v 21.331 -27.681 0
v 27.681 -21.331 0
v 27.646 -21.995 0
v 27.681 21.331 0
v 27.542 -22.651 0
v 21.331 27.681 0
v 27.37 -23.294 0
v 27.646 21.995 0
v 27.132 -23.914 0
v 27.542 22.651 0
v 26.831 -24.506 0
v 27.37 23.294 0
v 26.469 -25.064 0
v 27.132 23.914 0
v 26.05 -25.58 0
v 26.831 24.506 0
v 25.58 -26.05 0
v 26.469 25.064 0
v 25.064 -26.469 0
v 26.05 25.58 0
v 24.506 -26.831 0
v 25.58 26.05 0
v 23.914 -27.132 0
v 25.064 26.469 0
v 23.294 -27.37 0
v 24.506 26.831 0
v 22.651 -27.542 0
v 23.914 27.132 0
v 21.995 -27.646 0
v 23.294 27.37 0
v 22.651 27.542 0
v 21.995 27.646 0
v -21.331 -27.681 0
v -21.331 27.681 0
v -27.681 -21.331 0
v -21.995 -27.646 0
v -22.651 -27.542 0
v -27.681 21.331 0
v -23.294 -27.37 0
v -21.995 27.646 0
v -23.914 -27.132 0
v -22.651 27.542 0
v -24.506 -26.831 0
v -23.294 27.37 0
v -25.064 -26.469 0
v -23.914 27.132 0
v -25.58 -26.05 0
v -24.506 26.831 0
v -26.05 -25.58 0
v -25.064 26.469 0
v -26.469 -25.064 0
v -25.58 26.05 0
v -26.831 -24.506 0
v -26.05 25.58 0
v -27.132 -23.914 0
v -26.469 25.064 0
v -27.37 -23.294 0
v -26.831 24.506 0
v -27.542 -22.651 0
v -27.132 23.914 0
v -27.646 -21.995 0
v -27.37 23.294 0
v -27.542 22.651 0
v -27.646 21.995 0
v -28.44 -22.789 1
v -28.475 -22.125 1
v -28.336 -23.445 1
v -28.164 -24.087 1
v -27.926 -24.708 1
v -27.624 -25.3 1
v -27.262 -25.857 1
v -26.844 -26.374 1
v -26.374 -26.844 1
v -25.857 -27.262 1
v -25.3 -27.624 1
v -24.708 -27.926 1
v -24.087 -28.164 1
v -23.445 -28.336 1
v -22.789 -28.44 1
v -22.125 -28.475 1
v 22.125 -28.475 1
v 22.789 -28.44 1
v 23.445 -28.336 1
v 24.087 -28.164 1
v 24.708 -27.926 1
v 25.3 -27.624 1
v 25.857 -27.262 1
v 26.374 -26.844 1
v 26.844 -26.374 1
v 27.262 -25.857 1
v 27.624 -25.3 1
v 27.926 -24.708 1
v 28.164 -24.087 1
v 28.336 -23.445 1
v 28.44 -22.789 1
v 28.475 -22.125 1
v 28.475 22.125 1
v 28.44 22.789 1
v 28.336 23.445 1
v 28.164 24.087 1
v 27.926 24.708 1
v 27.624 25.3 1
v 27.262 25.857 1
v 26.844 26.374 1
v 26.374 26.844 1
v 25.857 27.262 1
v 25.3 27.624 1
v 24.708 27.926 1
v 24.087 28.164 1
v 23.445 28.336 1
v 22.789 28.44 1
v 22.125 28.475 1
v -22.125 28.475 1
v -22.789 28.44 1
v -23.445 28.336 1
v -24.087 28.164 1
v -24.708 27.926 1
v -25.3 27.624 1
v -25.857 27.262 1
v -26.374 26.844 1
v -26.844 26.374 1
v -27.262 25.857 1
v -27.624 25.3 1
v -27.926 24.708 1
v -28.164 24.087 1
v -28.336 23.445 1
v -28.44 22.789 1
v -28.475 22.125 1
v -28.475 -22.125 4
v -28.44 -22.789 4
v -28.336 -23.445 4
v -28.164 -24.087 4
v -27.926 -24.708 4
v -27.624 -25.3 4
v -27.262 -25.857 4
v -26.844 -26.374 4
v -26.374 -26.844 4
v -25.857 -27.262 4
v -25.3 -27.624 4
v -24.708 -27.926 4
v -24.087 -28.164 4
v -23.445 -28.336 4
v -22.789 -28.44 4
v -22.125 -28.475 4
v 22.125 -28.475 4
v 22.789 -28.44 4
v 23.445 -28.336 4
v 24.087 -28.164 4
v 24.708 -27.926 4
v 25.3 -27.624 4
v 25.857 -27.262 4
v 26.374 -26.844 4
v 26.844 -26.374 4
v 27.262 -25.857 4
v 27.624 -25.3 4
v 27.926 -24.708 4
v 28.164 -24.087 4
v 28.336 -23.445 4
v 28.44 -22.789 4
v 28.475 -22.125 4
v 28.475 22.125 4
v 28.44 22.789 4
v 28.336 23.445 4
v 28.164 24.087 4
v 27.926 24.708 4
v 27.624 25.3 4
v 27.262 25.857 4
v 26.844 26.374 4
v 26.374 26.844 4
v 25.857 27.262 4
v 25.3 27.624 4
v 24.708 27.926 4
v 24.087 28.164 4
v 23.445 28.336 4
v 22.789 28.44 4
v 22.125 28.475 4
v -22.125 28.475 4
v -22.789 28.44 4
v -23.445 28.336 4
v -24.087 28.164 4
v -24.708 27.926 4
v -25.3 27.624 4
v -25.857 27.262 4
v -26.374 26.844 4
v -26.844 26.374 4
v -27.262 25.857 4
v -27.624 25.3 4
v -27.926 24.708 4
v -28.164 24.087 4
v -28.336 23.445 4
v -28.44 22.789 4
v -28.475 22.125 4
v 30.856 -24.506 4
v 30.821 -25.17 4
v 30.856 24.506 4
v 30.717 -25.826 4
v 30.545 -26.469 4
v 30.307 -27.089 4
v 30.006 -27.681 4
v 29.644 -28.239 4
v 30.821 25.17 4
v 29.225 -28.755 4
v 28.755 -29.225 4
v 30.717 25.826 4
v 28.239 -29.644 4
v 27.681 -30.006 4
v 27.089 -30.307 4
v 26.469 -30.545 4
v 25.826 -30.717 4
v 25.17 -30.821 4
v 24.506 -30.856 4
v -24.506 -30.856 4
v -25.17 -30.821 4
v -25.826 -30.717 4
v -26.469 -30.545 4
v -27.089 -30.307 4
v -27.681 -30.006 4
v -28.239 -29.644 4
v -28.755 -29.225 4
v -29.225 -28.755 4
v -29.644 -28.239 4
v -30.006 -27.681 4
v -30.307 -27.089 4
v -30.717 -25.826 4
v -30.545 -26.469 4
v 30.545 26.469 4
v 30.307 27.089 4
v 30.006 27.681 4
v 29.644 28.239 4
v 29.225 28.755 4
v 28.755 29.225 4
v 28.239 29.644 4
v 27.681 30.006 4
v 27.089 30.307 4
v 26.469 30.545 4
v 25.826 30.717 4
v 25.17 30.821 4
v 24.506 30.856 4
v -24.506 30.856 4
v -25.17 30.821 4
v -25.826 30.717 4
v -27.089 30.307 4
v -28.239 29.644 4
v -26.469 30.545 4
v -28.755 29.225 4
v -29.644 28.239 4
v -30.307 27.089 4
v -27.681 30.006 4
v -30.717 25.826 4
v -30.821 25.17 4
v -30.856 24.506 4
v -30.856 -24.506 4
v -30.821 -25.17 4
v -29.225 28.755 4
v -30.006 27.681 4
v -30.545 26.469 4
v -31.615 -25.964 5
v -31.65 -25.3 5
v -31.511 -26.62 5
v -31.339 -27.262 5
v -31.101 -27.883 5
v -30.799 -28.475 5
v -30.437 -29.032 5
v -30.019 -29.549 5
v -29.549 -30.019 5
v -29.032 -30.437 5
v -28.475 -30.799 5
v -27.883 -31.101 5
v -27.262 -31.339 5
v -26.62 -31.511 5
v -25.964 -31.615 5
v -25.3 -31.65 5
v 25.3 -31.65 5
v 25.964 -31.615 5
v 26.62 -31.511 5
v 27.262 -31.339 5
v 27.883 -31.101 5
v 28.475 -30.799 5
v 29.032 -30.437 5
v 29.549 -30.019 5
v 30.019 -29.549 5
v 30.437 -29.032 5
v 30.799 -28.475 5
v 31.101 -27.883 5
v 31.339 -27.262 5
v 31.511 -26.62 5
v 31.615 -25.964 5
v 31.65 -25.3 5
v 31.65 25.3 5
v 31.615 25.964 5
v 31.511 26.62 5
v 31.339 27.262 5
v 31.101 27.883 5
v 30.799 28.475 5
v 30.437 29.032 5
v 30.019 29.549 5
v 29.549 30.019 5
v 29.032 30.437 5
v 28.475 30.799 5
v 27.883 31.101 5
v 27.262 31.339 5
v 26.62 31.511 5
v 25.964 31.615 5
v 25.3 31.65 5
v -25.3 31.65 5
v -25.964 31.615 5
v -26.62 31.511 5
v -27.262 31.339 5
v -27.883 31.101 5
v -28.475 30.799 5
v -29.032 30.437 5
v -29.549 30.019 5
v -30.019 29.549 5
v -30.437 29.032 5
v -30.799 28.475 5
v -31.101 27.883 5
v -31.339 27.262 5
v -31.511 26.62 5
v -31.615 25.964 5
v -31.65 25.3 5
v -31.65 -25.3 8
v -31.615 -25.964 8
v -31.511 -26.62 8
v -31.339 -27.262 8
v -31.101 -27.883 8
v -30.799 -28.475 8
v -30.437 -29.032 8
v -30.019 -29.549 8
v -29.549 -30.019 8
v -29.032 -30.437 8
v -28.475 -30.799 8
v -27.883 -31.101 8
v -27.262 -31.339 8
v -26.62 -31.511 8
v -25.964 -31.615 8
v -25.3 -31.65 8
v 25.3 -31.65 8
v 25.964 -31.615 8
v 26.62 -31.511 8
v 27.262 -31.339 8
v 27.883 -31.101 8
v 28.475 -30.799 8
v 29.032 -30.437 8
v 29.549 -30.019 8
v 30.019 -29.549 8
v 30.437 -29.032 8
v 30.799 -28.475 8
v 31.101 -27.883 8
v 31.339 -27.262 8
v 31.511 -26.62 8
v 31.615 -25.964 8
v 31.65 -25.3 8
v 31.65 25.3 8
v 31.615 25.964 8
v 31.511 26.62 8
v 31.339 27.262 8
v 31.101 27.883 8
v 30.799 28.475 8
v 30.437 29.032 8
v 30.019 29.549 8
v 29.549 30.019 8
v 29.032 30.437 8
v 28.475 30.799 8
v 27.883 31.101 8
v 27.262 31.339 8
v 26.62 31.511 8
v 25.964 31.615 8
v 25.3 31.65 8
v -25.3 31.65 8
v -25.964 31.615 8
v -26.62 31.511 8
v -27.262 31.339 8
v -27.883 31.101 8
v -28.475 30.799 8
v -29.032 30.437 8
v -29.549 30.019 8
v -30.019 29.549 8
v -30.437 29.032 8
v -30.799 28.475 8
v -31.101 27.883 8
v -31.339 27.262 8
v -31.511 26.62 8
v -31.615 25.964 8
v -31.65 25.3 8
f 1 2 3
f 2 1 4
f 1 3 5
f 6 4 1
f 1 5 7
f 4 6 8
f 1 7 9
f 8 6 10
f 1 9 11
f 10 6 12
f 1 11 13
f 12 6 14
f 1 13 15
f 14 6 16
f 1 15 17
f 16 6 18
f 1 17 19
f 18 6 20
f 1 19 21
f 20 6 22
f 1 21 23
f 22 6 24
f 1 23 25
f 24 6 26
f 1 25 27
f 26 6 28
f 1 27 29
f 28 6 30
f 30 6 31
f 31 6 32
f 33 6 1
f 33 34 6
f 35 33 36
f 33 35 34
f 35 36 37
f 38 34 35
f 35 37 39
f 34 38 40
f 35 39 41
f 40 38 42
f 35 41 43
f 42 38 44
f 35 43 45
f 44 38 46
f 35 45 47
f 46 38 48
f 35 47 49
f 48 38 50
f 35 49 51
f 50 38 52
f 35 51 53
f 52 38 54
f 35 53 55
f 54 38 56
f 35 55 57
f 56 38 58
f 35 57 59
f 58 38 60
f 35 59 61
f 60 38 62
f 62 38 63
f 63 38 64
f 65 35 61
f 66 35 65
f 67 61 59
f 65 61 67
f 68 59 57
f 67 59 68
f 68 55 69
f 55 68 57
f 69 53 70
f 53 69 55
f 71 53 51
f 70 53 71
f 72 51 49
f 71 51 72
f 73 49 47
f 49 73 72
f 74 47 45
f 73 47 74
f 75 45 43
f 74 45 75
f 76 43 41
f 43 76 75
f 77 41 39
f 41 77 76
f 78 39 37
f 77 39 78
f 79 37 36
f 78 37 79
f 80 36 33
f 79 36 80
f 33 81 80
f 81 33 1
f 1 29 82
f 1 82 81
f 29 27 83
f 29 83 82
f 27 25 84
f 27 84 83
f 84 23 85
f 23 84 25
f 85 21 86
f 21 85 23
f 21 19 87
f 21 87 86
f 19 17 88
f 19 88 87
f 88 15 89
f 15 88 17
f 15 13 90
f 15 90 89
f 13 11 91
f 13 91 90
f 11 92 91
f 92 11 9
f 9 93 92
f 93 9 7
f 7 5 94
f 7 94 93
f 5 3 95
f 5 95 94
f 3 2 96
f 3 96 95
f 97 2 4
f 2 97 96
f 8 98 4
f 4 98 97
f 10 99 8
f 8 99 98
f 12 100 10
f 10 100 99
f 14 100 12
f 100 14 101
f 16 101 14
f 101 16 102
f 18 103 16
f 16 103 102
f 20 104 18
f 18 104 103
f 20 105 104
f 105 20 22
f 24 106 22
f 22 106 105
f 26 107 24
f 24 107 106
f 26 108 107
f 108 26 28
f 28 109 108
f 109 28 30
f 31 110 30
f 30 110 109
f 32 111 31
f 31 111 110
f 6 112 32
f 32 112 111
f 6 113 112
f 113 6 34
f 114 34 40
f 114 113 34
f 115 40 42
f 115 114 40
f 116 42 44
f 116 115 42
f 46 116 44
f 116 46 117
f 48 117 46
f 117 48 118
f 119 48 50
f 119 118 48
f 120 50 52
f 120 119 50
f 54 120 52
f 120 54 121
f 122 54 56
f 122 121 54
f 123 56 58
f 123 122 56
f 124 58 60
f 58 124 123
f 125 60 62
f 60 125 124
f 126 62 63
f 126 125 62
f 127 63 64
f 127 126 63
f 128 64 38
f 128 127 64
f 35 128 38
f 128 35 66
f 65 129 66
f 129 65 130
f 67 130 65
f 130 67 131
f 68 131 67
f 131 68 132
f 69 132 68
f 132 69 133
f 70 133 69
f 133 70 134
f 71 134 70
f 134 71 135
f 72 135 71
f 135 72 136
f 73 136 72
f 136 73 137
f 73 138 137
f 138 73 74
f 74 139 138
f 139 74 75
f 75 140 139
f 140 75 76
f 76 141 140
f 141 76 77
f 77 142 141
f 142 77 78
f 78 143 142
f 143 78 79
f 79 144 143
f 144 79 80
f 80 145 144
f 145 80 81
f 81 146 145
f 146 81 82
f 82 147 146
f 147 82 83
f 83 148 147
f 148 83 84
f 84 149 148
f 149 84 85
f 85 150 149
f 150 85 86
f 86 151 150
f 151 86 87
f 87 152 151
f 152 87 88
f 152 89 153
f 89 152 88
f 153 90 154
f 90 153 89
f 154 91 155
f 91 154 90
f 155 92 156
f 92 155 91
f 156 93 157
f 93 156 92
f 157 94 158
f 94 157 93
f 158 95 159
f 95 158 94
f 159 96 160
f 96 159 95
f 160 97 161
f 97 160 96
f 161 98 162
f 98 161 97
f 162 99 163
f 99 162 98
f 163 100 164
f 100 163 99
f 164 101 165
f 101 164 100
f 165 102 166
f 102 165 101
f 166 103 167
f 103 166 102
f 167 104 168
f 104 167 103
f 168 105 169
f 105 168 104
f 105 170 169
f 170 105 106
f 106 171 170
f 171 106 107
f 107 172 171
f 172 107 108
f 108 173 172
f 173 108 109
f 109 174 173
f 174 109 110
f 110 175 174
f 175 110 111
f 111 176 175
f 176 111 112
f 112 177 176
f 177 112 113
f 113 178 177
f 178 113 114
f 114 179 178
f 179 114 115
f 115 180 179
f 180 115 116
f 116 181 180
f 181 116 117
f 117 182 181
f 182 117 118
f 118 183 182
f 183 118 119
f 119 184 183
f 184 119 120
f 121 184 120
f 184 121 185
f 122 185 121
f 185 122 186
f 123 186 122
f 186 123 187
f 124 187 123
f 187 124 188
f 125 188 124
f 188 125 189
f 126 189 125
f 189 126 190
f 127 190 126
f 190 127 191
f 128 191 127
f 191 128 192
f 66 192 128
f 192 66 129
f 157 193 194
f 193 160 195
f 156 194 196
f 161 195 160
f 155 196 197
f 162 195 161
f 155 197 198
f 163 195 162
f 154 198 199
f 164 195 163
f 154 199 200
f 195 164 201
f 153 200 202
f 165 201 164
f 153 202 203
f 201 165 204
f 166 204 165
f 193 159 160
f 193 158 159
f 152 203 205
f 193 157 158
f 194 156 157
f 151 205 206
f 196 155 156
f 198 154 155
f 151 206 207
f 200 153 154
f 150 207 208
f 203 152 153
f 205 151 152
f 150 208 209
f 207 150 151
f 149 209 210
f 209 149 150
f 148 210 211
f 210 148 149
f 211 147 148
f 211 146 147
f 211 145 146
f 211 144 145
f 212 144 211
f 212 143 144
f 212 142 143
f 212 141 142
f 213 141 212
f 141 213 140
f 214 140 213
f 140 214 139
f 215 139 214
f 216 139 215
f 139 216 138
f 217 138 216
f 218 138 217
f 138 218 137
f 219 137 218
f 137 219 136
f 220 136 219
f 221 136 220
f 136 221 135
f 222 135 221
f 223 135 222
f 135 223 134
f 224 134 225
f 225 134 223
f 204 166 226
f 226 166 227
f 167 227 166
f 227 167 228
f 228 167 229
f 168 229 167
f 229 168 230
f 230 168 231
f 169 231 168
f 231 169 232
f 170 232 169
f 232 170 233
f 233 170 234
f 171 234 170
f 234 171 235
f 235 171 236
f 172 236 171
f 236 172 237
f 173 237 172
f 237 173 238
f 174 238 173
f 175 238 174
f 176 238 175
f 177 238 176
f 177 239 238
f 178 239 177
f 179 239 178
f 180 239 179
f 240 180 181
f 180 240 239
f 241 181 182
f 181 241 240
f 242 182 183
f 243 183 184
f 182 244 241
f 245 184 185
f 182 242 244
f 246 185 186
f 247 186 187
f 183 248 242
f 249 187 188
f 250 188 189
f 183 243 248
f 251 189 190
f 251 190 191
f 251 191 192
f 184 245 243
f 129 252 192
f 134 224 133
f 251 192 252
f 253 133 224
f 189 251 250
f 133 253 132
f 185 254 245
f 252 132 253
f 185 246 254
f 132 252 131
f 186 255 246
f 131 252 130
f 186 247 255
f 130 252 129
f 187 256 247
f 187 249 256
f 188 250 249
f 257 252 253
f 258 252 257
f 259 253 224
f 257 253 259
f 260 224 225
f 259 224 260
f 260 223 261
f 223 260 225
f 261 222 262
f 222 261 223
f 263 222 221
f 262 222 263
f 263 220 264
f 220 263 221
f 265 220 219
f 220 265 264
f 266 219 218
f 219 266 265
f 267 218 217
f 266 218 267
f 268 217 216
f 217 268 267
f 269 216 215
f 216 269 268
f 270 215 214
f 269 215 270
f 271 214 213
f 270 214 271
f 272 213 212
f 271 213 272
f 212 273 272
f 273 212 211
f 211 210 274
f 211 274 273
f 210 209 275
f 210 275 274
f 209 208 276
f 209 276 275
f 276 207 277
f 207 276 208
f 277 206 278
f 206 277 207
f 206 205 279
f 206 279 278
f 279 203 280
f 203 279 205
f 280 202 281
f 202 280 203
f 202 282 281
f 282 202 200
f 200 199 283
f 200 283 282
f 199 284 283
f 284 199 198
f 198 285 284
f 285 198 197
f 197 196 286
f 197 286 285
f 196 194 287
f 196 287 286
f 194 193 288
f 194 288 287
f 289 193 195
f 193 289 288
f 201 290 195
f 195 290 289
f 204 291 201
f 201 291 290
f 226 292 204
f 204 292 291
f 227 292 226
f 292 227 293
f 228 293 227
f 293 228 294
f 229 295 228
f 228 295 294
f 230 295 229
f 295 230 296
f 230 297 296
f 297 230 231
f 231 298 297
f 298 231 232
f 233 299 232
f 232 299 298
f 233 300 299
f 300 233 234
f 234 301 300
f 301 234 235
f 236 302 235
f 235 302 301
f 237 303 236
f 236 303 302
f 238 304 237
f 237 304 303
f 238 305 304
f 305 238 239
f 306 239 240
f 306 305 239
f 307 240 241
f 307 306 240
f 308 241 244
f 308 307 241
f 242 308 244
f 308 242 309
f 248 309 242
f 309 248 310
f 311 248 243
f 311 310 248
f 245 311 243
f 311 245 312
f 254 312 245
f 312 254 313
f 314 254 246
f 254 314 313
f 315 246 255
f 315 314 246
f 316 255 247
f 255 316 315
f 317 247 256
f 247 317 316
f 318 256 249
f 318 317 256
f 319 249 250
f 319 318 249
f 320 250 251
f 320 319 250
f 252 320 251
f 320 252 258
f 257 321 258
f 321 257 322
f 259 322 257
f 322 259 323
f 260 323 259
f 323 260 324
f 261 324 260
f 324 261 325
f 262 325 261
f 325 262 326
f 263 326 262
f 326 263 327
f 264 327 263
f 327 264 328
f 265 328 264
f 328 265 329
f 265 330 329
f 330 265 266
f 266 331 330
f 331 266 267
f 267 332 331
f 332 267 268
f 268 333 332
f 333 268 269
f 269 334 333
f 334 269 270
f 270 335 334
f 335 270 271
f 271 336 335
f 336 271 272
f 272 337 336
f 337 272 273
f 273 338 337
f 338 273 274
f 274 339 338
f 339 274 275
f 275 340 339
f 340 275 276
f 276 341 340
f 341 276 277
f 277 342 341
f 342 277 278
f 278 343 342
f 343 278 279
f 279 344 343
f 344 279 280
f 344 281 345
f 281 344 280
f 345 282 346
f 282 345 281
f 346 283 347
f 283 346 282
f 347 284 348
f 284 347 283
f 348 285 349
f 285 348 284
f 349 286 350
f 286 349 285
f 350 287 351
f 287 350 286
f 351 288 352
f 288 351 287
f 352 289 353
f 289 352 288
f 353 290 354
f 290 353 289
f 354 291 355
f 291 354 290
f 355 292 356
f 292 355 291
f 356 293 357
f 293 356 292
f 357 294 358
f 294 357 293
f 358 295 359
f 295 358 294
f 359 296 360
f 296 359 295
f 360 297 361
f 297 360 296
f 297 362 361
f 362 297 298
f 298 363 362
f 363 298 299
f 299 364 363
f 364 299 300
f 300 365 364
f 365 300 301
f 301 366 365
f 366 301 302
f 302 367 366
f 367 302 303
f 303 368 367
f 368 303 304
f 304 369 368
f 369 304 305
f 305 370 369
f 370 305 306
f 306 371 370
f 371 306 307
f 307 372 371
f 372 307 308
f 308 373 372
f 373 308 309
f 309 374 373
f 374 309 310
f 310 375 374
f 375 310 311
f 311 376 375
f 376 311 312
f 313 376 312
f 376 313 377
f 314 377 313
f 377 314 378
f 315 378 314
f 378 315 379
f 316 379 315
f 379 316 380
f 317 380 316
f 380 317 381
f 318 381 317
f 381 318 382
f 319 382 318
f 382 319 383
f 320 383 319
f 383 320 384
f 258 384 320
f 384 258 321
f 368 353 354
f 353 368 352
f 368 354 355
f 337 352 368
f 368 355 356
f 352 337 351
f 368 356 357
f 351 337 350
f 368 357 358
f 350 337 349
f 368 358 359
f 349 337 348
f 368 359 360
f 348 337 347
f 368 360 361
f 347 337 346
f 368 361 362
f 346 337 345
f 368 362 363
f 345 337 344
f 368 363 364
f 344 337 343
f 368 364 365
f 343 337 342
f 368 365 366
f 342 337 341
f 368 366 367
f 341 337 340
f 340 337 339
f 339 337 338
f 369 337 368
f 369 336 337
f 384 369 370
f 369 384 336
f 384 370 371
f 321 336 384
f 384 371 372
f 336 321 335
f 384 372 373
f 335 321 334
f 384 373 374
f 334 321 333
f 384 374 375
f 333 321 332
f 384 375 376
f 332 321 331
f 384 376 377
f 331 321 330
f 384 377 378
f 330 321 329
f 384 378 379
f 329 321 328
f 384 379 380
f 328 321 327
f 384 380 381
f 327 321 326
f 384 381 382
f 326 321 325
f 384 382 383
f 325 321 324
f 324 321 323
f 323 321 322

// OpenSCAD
// BrickHolder2Insert v2.0

outer_offset = -0.1;
$fn = 64;

use <../lib/TOGridLib3.scad>
use <../lib/TOGMod1.scad>
use <../lib/TOGPath1.scad>
use <../lib/TOGPolyhedronLib1.scad>
use <../lib/TOGVecLib0.scad>

togmod1_domodule(["difference",
	tphl1_make_polyhedron_from_layer_function([
		[0, -5],
		[1, -4],
		[4, -4],
		[4, -1],
		[5,  0],
		[8,  0]
	], function(zo)
		let(atom = togridlib3_decode([1,"atom"]))
		let(u = togridlib3_decode([1,"u"]))
		let(rath = togpath1_make_rectangle_rath(
			[5*atom + zo[1]*u + outer_offset*2, 5*atom + zo[1]*u + outer_offset*2],
			corner_ops = [["round", 4*u]]
		))
		togvec0_offset_points(togpath1_rath_to_polypoints(rath), zo[0])
	)
]);
